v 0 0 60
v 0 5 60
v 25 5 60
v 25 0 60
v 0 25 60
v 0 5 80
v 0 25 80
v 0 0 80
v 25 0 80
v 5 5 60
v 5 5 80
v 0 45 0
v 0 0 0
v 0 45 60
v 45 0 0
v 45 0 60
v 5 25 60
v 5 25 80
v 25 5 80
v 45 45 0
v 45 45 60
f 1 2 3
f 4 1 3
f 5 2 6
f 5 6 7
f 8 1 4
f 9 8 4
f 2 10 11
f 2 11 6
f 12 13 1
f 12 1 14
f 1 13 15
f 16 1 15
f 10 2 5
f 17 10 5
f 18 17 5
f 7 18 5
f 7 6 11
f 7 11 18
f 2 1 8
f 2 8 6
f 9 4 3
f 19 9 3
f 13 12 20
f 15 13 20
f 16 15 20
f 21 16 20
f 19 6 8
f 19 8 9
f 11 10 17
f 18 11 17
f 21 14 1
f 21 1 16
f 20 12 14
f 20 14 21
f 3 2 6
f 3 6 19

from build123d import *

# Parameters (mm, degrees)
BOX_W        = 45
BOX_H        = 45
BOX_DEPTH    = 60
BOX001_W     = 25
BOX001_H     = 5
BOX001_DEPTH = 20
BOX002_W     = 20
BOX002_H     = 5
BOX002_DEPTH = 20


with BuildPart() as base:
    # Box → Box (new body)
    with BuildSketch(Plane.XY):
        with Locations((22.5, 22.5)):
            Rectangle(BOX_W, BOX_H)
    extrude(amount=BOX_DEPTH)


with BuildPart() as side1:
    # Box001 → Box001 (new body)
    with BuildSketch(Plane.XY.offset(60)):
        with Locations((12.5, 2.5)):
            Rectangle(BOX001_W, BOX001_H)
    extrude(amount=BOX001_DEPTH)


with BuildPart() as side2:
    # Box002 → Box002 (new body)
    with BuildSketch(Plane(origin=(5, 5, 60), x_dir=(0, 1, 0), z_dir=(0, 0, 1))):
        with Locations((10, 2.5)):
            Rectangle(BOX002_W, BOX002_H)
    extrude(amount=BOX002_DEPTH)


solid = Compound([base.part, side1.part, side2.part])
